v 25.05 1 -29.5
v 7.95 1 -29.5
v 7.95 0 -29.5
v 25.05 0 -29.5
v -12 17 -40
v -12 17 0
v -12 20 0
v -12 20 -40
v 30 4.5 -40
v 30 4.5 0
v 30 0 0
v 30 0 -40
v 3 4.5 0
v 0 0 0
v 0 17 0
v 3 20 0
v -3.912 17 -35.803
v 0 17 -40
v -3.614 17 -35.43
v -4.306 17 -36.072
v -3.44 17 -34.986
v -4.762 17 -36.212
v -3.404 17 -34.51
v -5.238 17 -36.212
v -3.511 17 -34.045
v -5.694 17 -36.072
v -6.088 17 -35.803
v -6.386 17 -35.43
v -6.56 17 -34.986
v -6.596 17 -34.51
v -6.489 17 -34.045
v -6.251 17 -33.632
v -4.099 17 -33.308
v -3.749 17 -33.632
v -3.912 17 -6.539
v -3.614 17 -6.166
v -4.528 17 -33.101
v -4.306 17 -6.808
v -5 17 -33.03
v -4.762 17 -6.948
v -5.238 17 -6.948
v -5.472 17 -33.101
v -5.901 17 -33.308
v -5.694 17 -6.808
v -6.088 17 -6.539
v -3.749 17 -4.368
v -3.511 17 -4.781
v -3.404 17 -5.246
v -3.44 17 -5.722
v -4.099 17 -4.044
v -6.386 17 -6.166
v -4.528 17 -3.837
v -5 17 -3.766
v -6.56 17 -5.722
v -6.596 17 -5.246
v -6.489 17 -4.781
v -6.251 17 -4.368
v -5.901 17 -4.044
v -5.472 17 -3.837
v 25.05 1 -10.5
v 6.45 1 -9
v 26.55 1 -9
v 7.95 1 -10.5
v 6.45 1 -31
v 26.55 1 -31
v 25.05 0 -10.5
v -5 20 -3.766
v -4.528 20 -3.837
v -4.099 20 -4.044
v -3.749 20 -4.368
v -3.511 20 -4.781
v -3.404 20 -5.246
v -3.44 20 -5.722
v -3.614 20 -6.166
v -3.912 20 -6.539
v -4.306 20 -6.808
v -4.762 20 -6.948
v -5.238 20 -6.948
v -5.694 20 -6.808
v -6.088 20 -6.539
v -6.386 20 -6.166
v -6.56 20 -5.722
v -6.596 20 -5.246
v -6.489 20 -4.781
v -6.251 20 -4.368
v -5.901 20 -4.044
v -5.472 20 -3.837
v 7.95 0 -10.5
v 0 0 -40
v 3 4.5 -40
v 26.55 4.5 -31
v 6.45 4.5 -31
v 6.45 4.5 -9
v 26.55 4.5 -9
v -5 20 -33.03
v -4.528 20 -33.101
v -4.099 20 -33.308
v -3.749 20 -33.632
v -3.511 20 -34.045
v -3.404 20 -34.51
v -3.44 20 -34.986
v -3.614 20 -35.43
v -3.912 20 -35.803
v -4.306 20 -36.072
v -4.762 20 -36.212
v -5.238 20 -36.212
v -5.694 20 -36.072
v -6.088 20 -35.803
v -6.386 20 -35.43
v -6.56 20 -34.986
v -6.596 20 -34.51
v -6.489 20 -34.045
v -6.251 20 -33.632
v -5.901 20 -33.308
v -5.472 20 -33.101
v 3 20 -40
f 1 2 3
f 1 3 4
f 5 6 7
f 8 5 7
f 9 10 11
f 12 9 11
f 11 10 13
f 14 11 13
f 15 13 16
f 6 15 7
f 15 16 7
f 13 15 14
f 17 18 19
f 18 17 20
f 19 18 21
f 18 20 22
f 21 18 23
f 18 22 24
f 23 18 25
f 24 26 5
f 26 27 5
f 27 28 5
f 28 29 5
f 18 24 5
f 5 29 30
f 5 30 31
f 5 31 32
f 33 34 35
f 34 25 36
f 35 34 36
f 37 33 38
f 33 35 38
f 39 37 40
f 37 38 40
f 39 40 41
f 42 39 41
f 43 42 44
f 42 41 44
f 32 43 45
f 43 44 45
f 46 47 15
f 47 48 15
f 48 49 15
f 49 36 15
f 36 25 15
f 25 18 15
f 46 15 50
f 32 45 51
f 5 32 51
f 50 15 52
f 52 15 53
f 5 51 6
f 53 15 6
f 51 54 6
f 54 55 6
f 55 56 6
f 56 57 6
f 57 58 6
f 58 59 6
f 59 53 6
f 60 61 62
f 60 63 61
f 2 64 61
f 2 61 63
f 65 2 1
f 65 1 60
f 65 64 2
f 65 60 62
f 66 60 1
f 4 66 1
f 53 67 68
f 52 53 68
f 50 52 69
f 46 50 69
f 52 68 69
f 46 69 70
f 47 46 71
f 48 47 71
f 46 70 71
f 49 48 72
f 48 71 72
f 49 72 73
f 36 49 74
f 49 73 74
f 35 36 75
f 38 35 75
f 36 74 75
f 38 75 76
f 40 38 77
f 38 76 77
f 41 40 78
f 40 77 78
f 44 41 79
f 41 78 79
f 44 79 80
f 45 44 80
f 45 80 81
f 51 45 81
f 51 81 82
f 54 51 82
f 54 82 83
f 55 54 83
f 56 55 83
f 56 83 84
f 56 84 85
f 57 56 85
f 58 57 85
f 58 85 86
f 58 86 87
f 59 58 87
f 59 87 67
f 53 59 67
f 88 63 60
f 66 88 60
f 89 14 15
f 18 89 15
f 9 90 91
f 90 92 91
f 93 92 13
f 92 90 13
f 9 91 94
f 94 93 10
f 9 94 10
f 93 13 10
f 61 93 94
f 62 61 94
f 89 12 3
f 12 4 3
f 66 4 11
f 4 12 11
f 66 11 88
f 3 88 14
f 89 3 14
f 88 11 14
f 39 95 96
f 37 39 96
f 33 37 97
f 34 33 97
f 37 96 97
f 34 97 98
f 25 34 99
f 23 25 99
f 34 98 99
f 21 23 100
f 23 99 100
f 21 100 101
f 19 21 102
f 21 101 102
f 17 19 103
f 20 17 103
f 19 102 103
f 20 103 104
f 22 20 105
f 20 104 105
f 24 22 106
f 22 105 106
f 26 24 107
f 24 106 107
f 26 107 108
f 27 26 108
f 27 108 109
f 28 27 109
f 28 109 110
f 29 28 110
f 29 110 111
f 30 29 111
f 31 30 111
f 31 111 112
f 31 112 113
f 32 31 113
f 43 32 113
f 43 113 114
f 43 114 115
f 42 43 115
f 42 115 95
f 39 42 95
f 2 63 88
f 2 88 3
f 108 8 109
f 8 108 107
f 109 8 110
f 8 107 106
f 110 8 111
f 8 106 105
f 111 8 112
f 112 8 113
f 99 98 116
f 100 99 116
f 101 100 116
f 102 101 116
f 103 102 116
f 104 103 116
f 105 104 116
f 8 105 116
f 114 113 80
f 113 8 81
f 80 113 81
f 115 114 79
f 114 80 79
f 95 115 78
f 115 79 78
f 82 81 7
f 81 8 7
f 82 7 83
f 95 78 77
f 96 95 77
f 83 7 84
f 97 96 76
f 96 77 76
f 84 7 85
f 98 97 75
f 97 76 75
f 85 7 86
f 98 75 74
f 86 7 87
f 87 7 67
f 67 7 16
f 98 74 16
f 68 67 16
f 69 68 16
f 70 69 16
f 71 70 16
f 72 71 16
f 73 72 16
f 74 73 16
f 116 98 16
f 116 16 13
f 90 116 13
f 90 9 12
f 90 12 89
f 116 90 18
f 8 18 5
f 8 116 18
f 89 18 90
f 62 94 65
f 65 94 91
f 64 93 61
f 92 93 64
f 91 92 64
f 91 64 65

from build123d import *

# Parameters (mm, degrees)
BOSS_EXTRUDE1_DEPTH = 40
SKETCH2_W           = 20.1
SKETCH2_H           = 22
CUT_EXTRUDE1_DEPTH  = 3.5
SKETCH3_W           = 17.1
SKETCH3_H           = 19
CUT_EXTRUDE2_DEPTH  = 54.488316481
SKETCH4_R           = 1.6
CUT_EXTRUDE3_DEPTH  = 54.851648071


with BuildPart() as part:
    # Sketch1 → Boss-Extrude1 (new body)
    with BuildSketch(Plane.XY):
        Polygon((0, 0), (0, 17), (-12, 17), (-12, 20), (3, 20), (3, 4.5), (30, 4.5), (30, 0), align=None)
    extrude(amount=-BOSS_EXTRUDE1_DEPTH)

    # Sketch2 → Cut-Extrude1 (cut)
    with BuildSketch(Plane(origin=(0, 4.5, 0), x_dir=(1, 0, 0), z_dir=(0, 1, 0))):
        with Locations((16.5, 20)):
            Rectangle(SKETCH2_W, SKETCH2_H)
    extrude(amount=-CUT_EXTRUDE1_DEPTH, mode=Mode.SUBTRACT)

    # Sketch3 → Cut-Extrude2 (cut, through all)
    with BuildSketch(Plane(origin=(0, 1, 0), x_dir=(1, 0, 0), z_dir=(0, 1, 0))):
        with Locations((16.5, 20)):
            Rectangle(SKETCH3_W, SKETCH3_H)
    extrude(amount=-CUT_EXTRUDE2_DEPTH, mode=Mode.SUBTRACT)

    # Sketch4 → Cut-Extrude3 (cut, through all)
    with BuildSketch(Plane(origin=(0, 20, 0), x_dir=(1, 0, 0), z_dir=(0, 1, 0))):
        with Locations((-5, 34.63)):
            Circle(SKETCH4_R)
        with Locations((-5, 5.366)):
            Circle(SKETCH4_R)
    extrude(amount=-CUT_EXTRUDE3_DEPTH, mode=Mode.SUBTRACT)


solid = part.part
